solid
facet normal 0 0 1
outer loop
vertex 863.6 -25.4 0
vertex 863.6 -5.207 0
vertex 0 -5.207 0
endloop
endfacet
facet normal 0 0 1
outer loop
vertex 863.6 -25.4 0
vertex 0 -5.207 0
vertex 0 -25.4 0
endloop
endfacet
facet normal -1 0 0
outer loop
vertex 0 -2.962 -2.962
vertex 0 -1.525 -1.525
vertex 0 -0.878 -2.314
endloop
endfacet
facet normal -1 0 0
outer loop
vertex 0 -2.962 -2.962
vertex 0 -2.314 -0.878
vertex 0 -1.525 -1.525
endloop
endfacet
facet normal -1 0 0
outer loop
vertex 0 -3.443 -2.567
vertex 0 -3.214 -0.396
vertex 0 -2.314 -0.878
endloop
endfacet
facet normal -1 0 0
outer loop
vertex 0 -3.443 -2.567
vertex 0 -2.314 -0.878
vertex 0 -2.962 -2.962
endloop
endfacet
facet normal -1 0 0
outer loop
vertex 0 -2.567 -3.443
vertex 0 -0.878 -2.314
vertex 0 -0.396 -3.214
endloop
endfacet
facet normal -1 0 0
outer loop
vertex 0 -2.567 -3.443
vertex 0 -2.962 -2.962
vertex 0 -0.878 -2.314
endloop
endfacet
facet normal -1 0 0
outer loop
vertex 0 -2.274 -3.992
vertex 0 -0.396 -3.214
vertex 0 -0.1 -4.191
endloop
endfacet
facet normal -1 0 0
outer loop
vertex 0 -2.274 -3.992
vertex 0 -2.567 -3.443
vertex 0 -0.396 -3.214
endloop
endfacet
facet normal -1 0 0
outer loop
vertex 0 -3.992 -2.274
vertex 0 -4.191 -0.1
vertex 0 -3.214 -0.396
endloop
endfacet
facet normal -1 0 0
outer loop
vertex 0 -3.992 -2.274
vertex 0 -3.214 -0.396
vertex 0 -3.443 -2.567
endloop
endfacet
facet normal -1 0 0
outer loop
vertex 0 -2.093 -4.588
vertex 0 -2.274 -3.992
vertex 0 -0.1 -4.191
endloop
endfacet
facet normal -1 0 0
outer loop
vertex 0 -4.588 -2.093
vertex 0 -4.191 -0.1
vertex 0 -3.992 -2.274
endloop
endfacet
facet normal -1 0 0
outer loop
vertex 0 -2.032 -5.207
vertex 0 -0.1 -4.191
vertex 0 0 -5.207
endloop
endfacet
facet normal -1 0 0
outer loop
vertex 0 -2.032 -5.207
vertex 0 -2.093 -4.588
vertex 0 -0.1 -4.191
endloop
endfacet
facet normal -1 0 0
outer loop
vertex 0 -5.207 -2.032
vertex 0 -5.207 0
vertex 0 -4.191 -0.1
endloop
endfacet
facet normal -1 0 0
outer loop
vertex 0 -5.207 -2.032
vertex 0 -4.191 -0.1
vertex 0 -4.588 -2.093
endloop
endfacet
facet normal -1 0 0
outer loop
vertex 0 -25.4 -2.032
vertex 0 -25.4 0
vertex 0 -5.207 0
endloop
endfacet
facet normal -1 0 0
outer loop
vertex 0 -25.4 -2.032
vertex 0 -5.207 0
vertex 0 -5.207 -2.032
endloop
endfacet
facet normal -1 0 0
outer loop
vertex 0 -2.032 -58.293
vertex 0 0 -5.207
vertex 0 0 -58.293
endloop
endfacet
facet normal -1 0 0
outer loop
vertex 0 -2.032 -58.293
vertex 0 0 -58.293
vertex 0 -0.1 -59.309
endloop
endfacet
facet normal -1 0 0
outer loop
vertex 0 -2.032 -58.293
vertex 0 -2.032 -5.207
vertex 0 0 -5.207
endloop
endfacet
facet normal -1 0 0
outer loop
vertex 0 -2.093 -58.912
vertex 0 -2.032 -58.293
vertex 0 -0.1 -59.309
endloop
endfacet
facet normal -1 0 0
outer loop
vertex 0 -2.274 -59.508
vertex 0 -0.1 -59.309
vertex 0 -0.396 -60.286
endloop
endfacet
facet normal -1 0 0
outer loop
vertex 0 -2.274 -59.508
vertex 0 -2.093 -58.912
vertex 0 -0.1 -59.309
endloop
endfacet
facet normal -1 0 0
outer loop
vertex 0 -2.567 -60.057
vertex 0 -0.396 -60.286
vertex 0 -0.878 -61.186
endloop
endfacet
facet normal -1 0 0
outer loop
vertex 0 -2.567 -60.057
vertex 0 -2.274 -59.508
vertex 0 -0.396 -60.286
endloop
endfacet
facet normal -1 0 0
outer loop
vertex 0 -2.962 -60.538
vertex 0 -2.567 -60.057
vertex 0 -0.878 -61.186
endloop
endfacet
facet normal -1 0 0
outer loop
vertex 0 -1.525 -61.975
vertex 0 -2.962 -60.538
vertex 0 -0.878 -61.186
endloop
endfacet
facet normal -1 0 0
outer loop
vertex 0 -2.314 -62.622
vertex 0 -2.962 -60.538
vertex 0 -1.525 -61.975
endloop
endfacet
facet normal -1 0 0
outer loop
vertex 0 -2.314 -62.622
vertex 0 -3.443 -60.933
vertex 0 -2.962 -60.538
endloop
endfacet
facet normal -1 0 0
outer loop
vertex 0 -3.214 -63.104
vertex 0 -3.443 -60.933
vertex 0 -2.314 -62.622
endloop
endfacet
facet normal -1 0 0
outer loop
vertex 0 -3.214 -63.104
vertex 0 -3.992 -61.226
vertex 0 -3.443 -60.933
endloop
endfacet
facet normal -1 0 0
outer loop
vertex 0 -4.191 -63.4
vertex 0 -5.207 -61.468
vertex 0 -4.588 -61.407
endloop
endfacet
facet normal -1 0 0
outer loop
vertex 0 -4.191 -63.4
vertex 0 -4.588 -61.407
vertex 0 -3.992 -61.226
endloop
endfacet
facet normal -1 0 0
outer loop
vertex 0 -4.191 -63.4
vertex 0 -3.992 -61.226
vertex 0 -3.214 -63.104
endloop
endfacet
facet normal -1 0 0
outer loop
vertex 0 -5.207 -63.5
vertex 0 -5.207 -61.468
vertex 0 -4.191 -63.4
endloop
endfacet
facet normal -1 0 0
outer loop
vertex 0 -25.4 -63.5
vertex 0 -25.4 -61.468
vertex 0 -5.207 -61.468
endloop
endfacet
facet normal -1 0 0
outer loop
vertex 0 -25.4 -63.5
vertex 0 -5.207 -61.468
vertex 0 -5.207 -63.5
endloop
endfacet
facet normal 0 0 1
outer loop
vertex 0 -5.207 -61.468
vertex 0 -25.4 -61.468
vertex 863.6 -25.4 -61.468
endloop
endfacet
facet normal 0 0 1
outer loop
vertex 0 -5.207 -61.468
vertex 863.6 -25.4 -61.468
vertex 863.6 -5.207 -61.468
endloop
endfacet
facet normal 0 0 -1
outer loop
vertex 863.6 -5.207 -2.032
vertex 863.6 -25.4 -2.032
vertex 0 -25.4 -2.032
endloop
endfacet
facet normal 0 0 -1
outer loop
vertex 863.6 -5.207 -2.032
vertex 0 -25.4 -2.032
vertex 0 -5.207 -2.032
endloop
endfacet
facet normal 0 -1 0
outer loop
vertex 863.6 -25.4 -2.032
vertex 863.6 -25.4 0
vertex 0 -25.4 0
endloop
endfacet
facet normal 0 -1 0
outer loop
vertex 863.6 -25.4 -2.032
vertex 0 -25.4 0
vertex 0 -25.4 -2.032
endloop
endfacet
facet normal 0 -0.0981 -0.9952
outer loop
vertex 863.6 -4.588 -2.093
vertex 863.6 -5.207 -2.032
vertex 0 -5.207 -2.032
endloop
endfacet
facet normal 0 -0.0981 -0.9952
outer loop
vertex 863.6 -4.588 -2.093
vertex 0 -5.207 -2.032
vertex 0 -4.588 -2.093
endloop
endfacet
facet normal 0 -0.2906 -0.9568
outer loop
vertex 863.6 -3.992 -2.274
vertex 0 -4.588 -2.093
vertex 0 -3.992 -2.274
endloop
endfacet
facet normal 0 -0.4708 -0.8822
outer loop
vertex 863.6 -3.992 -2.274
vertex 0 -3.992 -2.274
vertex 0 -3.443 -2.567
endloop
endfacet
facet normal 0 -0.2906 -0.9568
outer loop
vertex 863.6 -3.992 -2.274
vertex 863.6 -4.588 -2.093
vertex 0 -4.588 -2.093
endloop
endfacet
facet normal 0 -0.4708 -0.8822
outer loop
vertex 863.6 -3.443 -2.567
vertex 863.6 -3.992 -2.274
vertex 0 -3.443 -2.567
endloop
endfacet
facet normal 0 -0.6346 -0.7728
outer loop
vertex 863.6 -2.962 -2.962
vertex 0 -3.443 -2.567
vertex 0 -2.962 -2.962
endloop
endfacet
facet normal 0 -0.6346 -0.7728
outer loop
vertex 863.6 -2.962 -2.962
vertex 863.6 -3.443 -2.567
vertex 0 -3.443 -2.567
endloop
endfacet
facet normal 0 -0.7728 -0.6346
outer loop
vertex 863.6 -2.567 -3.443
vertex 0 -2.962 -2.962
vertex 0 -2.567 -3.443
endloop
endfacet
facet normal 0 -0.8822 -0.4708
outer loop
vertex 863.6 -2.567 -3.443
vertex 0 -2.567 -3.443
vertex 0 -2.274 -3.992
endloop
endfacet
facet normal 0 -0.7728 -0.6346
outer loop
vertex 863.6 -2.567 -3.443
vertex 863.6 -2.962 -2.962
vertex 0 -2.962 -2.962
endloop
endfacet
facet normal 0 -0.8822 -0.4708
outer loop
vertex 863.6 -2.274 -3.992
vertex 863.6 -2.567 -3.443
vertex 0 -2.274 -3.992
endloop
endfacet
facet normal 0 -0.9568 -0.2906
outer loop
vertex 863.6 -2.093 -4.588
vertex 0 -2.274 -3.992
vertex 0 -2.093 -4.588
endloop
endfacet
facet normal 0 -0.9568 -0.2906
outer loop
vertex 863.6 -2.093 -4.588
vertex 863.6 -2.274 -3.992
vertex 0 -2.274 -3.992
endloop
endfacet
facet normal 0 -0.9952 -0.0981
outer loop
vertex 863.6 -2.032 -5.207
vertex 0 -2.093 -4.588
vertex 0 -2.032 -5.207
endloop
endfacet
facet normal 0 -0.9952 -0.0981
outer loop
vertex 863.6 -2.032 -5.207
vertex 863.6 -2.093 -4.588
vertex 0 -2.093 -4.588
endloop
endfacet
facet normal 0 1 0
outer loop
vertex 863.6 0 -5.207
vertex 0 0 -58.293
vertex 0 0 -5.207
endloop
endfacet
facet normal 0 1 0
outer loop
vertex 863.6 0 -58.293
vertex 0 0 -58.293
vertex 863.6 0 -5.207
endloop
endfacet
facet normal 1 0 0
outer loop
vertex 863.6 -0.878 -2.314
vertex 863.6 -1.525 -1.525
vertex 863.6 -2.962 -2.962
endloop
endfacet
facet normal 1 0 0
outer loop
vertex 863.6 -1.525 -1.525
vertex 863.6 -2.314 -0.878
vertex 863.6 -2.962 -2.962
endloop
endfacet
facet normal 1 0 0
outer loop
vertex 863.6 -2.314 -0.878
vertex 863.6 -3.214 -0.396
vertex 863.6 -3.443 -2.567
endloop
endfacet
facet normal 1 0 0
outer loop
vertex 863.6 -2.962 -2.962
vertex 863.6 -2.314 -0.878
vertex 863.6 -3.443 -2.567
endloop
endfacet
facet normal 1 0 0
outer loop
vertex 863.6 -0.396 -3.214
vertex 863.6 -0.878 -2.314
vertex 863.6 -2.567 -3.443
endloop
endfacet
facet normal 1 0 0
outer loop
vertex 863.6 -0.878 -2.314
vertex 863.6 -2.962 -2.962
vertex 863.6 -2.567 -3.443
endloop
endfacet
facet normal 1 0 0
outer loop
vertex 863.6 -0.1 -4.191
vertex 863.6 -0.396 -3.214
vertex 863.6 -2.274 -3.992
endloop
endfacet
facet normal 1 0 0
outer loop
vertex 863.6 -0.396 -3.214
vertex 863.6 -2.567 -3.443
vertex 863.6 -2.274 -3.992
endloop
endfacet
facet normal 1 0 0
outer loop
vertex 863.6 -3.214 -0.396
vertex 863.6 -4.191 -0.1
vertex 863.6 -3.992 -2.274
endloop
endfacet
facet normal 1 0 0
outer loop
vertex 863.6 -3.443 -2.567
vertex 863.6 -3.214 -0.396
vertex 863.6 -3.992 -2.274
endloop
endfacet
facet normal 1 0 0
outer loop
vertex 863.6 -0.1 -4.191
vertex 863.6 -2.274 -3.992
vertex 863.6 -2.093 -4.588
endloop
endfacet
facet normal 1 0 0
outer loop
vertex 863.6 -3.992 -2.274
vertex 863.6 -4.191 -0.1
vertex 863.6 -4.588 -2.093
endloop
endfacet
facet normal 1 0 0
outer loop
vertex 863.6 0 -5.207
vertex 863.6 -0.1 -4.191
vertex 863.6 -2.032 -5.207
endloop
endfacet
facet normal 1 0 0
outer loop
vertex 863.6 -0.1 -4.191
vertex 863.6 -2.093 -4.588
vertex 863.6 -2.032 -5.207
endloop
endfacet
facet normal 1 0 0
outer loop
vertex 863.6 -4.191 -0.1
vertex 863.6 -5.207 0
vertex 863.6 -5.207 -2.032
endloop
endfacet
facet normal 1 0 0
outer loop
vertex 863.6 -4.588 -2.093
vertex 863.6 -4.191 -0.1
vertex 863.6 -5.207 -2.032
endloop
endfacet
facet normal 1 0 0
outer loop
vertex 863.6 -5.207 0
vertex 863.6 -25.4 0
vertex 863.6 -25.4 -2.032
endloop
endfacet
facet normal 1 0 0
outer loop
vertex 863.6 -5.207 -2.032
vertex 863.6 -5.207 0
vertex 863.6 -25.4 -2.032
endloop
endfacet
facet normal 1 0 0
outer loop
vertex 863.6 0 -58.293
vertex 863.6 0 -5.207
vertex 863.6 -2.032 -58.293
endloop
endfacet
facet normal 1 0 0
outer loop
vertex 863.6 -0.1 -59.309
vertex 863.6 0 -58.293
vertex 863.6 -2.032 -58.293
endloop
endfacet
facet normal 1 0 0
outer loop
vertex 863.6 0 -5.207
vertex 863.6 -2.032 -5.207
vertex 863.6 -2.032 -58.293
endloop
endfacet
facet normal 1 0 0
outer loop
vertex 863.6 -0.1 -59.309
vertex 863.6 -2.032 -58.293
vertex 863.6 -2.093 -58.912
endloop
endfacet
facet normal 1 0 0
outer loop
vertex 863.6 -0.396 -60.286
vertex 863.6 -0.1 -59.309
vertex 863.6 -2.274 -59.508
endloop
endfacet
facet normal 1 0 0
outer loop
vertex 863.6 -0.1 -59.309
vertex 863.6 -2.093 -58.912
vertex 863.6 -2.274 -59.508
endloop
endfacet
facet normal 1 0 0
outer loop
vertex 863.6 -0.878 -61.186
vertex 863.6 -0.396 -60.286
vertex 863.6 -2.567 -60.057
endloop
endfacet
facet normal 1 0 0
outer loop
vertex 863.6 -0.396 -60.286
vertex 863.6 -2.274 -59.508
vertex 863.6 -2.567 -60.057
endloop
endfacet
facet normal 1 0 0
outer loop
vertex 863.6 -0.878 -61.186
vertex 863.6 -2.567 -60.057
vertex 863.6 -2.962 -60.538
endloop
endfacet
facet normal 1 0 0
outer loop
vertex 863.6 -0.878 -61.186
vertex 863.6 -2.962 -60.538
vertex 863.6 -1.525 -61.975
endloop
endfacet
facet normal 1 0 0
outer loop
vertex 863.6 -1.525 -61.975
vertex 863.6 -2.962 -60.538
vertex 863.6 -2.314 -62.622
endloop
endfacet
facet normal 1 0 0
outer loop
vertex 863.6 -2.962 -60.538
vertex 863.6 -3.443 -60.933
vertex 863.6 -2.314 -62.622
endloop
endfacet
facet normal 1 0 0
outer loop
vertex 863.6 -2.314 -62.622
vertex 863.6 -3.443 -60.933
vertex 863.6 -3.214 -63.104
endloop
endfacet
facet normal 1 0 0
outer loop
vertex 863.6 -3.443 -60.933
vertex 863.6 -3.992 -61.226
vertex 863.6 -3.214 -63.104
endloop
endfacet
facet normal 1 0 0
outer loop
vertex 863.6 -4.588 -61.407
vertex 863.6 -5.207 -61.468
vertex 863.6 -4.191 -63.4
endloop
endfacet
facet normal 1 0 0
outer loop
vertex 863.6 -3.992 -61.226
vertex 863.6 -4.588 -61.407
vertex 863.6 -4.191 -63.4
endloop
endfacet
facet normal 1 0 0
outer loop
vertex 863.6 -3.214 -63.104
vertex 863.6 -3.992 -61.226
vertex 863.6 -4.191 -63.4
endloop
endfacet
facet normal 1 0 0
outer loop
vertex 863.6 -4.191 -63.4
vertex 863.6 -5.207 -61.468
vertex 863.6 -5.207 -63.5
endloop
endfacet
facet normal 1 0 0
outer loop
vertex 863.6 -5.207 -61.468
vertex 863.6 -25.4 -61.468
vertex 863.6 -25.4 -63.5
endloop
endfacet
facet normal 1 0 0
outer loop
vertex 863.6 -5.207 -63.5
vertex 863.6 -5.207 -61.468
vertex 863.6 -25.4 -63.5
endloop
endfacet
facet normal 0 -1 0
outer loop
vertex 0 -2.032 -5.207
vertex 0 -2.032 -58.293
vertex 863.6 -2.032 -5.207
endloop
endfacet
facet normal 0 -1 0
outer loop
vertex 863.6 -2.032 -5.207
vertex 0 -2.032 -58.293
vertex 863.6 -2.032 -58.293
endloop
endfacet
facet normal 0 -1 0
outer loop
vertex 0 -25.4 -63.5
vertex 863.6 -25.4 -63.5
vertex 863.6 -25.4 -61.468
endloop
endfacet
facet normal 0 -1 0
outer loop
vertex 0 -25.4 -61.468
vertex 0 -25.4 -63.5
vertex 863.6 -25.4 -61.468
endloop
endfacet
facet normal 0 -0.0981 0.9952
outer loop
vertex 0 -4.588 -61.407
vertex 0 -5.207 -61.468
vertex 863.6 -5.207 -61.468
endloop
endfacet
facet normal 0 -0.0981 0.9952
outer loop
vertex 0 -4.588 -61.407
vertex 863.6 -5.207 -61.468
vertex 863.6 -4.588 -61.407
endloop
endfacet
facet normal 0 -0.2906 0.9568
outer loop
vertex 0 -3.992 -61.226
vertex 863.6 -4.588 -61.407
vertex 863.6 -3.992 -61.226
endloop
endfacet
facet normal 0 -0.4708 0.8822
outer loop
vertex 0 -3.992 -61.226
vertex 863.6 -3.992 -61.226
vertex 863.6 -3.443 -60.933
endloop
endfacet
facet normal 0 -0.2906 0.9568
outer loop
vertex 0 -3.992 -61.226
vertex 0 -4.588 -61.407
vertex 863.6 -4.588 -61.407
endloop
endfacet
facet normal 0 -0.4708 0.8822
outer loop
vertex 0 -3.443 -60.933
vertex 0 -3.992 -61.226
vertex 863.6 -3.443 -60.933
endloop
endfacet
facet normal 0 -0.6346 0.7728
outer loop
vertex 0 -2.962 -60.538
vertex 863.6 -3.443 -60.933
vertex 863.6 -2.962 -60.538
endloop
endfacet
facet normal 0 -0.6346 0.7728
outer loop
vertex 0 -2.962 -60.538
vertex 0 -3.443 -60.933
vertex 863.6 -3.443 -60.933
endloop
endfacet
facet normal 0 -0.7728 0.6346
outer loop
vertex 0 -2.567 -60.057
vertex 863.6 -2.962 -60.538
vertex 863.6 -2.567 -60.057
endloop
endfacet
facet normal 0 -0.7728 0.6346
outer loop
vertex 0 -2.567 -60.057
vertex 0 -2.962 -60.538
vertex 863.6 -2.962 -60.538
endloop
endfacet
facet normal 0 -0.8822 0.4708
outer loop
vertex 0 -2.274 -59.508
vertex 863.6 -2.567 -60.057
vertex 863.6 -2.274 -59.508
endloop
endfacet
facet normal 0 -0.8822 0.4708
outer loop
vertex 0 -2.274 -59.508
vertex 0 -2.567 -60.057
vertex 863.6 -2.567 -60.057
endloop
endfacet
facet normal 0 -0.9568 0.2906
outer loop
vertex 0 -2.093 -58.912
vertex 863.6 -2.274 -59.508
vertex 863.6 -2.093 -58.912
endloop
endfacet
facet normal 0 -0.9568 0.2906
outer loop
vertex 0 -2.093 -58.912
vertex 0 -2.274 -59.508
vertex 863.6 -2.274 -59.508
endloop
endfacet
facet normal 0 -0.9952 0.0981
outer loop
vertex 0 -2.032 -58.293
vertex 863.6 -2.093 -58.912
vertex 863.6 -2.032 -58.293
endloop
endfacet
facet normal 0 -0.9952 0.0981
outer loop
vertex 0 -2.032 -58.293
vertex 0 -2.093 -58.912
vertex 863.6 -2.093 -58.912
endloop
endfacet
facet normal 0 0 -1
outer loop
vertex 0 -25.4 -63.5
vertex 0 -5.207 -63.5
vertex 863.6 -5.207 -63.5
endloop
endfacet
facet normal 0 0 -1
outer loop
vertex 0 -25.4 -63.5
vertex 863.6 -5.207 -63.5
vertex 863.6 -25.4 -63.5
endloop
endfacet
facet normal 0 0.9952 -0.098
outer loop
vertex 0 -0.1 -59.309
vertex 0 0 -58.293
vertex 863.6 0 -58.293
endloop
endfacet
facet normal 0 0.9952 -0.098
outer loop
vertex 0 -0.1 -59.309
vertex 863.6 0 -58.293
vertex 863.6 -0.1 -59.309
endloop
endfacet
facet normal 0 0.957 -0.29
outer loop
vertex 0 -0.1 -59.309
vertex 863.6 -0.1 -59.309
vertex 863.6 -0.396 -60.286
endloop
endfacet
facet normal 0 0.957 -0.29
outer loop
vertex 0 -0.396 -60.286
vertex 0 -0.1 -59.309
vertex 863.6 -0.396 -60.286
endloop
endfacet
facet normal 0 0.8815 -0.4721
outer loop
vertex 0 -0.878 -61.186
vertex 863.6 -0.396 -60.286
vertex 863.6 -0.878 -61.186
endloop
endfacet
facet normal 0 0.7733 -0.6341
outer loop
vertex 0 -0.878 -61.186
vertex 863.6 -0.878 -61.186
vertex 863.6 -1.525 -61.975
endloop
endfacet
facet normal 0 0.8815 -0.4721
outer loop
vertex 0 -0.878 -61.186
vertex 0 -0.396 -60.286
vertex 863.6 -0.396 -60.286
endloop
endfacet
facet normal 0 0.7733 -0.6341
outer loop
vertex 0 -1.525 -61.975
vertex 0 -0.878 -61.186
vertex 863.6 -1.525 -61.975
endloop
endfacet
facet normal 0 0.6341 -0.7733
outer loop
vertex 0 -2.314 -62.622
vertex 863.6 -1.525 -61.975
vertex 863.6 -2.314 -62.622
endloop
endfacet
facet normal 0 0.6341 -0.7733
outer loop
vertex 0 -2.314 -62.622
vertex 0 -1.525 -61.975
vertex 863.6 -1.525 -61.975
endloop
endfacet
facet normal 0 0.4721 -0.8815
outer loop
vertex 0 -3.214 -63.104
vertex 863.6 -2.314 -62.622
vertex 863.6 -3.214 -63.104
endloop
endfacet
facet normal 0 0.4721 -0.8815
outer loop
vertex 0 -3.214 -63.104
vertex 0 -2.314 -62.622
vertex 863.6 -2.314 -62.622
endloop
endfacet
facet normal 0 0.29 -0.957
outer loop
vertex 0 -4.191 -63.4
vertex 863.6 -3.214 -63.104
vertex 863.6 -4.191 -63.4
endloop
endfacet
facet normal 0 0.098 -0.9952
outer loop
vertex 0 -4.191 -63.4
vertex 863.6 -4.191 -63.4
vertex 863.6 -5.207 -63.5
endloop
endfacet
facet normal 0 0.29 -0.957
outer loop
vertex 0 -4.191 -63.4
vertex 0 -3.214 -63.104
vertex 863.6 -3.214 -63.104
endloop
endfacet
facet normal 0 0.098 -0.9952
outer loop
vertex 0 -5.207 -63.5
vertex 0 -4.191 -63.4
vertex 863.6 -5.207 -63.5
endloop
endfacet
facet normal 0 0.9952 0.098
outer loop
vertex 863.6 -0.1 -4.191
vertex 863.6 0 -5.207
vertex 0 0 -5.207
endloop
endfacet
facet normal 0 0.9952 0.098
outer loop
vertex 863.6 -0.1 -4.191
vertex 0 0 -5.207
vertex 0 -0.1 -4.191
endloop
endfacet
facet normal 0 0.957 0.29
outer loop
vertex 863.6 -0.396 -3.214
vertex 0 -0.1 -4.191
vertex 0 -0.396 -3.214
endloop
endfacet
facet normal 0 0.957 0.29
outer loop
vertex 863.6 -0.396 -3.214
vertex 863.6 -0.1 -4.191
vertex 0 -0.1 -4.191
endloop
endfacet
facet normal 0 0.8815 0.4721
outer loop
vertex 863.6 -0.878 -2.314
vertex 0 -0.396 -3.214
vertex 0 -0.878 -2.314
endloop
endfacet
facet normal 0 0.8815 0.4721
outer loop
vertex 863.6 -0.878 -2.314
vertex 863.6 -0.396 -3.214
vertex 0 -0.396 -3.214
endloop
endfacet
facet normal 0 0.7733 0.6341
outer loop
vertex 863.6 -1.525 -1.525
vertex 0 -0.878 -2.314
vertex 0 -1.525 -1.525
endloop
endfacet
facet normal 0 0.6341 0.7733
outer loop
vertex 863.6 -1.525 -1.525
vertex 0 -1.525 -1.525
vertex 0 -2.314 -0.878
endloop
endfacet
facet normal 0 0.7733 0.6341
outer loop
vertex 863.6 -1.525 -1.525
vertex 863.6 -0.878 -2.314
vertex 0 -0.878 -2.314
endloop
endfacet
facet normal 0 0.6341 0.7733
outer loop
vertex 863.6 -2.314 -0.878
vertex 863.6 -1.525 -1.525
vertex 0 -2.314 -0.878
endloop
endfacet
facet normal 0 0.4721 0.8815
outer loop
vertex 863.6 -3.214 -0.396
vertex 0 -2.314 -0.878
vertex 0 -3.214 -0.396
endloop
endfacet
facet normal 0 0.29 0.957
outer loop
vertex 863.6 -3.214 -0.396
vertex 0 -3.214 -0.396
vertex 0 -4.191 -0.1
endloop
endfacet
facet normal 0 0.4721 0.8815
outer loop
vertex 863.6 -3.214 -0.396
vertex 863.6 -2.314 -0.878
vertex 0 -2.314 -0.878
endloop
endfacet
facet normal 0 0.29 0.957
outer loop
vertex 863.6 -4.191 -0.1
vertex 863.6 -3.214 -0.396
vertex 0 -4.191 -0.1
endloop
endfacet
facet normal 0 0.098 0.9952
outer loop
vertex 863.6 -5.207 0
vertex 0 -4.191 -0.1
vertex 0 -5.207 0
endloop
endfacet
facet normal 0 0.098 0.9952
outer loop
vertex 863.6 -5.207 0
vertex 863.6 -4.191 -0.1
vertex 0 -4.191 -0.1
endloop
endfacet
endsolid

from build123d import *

# Parameters (mm, degrees)
SKETCH1_W                      = 863.6
SKETCH1_H                      = 63.5
BASE_FLANGE1_DEPTH             = 2.032
EDGE_FLANGE1_STRIP_W           = 14.478
EDGE_FLANGE1_STRIP_H           = 2.032
EDGE_FLANGE1_STRIP_CUT_DEPTH   = 863.6
EDGE_FLANGE1_STRIP_2_W         = 14.478
EDGE_FLANGE1_STRIP_2_H         = 2.032
EDGE_FLANGE1_STRIP_CUT_2_DEPTH = 863.6
EDGE_FLANGE1_DEPTH             = 863.6
EDGE_FLANGE1_BEND_DEPTH        = 863.6


# Sheet-metal steps are written as plain solids
with BuildPart() as part:
    # Sketch1 → Base-Flange1 (new body)
    with BuildSketch(Plane(origin=(0, 0, 0), x_dir=(1, 0, 0), z_dir=(0, 1, 0))):
        with Locations((431.8, 31.75)):
            Rectangle(SKETCH1_W, SKETCH1_H)
    extrude(amount=-BASE_FLANGE1_DEPTH)

    # Edge-Flange1 strip (across the edge) → Edge-Flange1 strip cut (cut)
    with BuildSketch(Plane(origin=(863.6, -2.032, 0), x_dir=(0, 0, -1), z_dir=(-1, 0, 0))):
        with Locations((-2.032, -1.016)):
            Rectangle(EDGE_FLANGE1_STRIP_W, EDGE_FLANGE1_STRIP_H)
    extrude(amount=EDGE_FLANGE1_STRIP_CUT_DEPTH, mode=Mode.SUBTRACT)

    # Edge-Flange1 strip 2 (across the edge) → Edge-Flange1 strip cut 2 (cut)
    with BuildSketch(Plane(origin=(0, -2.032, -63.5), x_dir=(0, 0, 1), z_dir=(1, 0, 0))):
        with Locations((-2.032, -1.016)):
            Rectangle(EDGE_FLANGE1_STRIP_2_W, EDGE_FLANGE1_STRIP_2_H)
    extrude(amount=EDGE_FLANGE1_STRIP_CUT_2_DEPTH, mode=Mode.SUBTRACT)

    # Edge-Flange1 section (across the edge) → Edge-Flange1 (add)
    with BuildSketch(Plane(origin=(863.6, -2.032, 0), x_dir=(0, 0, -1), z_dir=(-1, 0, 0))):
        with BuildLine():
            Line((0, 3.175), (0, 23.368))
            Line((0, 23.368), (2.032, 23.368))
            Line((2.032, 23.368), (2.032, 3.175))
            ThreePointArc((2.032, 3.175), (2.96193597, 0.92993597), (5.207, 0))
            Line((5.207, 0), (5.207, -2.032))
            ThreePointArc((5.207, -2.032), (1.52509499, -0.50690501), (0, 3.175))
        make_face()
    extrude(amount=EDGE_FLANGE1_DEPTH)

    # Edge-Flange1 section 2 (across the edge) → Edge-Flange1 bend (add)
    with BuildSketch(Plane(origin=(0, -2.032, -63.5), x_dir=(0, 0, 1), z_dir=(1, 0, 0))):
        with BuildLine():
            Line((0, 3.175), (0, 23.368))
            Line((0, 23.368), (2.032, 23.368))
            Line((2.032, 23.368), (2.032, 3.175))
            ThreePointArc((2.032, 3.175), (2.96193597, 0.92993597), (5.207, 0))
            Line((5.207, 0), (5.207, -2.032))
            ThreePointArc((5.207, -2.032), (1.52509499, -0.50690501), (0, 3.175))
        make_face()
    extrude(amount=EDGE_FLANGE1_BEND_DEPTH)


solid = part.part
